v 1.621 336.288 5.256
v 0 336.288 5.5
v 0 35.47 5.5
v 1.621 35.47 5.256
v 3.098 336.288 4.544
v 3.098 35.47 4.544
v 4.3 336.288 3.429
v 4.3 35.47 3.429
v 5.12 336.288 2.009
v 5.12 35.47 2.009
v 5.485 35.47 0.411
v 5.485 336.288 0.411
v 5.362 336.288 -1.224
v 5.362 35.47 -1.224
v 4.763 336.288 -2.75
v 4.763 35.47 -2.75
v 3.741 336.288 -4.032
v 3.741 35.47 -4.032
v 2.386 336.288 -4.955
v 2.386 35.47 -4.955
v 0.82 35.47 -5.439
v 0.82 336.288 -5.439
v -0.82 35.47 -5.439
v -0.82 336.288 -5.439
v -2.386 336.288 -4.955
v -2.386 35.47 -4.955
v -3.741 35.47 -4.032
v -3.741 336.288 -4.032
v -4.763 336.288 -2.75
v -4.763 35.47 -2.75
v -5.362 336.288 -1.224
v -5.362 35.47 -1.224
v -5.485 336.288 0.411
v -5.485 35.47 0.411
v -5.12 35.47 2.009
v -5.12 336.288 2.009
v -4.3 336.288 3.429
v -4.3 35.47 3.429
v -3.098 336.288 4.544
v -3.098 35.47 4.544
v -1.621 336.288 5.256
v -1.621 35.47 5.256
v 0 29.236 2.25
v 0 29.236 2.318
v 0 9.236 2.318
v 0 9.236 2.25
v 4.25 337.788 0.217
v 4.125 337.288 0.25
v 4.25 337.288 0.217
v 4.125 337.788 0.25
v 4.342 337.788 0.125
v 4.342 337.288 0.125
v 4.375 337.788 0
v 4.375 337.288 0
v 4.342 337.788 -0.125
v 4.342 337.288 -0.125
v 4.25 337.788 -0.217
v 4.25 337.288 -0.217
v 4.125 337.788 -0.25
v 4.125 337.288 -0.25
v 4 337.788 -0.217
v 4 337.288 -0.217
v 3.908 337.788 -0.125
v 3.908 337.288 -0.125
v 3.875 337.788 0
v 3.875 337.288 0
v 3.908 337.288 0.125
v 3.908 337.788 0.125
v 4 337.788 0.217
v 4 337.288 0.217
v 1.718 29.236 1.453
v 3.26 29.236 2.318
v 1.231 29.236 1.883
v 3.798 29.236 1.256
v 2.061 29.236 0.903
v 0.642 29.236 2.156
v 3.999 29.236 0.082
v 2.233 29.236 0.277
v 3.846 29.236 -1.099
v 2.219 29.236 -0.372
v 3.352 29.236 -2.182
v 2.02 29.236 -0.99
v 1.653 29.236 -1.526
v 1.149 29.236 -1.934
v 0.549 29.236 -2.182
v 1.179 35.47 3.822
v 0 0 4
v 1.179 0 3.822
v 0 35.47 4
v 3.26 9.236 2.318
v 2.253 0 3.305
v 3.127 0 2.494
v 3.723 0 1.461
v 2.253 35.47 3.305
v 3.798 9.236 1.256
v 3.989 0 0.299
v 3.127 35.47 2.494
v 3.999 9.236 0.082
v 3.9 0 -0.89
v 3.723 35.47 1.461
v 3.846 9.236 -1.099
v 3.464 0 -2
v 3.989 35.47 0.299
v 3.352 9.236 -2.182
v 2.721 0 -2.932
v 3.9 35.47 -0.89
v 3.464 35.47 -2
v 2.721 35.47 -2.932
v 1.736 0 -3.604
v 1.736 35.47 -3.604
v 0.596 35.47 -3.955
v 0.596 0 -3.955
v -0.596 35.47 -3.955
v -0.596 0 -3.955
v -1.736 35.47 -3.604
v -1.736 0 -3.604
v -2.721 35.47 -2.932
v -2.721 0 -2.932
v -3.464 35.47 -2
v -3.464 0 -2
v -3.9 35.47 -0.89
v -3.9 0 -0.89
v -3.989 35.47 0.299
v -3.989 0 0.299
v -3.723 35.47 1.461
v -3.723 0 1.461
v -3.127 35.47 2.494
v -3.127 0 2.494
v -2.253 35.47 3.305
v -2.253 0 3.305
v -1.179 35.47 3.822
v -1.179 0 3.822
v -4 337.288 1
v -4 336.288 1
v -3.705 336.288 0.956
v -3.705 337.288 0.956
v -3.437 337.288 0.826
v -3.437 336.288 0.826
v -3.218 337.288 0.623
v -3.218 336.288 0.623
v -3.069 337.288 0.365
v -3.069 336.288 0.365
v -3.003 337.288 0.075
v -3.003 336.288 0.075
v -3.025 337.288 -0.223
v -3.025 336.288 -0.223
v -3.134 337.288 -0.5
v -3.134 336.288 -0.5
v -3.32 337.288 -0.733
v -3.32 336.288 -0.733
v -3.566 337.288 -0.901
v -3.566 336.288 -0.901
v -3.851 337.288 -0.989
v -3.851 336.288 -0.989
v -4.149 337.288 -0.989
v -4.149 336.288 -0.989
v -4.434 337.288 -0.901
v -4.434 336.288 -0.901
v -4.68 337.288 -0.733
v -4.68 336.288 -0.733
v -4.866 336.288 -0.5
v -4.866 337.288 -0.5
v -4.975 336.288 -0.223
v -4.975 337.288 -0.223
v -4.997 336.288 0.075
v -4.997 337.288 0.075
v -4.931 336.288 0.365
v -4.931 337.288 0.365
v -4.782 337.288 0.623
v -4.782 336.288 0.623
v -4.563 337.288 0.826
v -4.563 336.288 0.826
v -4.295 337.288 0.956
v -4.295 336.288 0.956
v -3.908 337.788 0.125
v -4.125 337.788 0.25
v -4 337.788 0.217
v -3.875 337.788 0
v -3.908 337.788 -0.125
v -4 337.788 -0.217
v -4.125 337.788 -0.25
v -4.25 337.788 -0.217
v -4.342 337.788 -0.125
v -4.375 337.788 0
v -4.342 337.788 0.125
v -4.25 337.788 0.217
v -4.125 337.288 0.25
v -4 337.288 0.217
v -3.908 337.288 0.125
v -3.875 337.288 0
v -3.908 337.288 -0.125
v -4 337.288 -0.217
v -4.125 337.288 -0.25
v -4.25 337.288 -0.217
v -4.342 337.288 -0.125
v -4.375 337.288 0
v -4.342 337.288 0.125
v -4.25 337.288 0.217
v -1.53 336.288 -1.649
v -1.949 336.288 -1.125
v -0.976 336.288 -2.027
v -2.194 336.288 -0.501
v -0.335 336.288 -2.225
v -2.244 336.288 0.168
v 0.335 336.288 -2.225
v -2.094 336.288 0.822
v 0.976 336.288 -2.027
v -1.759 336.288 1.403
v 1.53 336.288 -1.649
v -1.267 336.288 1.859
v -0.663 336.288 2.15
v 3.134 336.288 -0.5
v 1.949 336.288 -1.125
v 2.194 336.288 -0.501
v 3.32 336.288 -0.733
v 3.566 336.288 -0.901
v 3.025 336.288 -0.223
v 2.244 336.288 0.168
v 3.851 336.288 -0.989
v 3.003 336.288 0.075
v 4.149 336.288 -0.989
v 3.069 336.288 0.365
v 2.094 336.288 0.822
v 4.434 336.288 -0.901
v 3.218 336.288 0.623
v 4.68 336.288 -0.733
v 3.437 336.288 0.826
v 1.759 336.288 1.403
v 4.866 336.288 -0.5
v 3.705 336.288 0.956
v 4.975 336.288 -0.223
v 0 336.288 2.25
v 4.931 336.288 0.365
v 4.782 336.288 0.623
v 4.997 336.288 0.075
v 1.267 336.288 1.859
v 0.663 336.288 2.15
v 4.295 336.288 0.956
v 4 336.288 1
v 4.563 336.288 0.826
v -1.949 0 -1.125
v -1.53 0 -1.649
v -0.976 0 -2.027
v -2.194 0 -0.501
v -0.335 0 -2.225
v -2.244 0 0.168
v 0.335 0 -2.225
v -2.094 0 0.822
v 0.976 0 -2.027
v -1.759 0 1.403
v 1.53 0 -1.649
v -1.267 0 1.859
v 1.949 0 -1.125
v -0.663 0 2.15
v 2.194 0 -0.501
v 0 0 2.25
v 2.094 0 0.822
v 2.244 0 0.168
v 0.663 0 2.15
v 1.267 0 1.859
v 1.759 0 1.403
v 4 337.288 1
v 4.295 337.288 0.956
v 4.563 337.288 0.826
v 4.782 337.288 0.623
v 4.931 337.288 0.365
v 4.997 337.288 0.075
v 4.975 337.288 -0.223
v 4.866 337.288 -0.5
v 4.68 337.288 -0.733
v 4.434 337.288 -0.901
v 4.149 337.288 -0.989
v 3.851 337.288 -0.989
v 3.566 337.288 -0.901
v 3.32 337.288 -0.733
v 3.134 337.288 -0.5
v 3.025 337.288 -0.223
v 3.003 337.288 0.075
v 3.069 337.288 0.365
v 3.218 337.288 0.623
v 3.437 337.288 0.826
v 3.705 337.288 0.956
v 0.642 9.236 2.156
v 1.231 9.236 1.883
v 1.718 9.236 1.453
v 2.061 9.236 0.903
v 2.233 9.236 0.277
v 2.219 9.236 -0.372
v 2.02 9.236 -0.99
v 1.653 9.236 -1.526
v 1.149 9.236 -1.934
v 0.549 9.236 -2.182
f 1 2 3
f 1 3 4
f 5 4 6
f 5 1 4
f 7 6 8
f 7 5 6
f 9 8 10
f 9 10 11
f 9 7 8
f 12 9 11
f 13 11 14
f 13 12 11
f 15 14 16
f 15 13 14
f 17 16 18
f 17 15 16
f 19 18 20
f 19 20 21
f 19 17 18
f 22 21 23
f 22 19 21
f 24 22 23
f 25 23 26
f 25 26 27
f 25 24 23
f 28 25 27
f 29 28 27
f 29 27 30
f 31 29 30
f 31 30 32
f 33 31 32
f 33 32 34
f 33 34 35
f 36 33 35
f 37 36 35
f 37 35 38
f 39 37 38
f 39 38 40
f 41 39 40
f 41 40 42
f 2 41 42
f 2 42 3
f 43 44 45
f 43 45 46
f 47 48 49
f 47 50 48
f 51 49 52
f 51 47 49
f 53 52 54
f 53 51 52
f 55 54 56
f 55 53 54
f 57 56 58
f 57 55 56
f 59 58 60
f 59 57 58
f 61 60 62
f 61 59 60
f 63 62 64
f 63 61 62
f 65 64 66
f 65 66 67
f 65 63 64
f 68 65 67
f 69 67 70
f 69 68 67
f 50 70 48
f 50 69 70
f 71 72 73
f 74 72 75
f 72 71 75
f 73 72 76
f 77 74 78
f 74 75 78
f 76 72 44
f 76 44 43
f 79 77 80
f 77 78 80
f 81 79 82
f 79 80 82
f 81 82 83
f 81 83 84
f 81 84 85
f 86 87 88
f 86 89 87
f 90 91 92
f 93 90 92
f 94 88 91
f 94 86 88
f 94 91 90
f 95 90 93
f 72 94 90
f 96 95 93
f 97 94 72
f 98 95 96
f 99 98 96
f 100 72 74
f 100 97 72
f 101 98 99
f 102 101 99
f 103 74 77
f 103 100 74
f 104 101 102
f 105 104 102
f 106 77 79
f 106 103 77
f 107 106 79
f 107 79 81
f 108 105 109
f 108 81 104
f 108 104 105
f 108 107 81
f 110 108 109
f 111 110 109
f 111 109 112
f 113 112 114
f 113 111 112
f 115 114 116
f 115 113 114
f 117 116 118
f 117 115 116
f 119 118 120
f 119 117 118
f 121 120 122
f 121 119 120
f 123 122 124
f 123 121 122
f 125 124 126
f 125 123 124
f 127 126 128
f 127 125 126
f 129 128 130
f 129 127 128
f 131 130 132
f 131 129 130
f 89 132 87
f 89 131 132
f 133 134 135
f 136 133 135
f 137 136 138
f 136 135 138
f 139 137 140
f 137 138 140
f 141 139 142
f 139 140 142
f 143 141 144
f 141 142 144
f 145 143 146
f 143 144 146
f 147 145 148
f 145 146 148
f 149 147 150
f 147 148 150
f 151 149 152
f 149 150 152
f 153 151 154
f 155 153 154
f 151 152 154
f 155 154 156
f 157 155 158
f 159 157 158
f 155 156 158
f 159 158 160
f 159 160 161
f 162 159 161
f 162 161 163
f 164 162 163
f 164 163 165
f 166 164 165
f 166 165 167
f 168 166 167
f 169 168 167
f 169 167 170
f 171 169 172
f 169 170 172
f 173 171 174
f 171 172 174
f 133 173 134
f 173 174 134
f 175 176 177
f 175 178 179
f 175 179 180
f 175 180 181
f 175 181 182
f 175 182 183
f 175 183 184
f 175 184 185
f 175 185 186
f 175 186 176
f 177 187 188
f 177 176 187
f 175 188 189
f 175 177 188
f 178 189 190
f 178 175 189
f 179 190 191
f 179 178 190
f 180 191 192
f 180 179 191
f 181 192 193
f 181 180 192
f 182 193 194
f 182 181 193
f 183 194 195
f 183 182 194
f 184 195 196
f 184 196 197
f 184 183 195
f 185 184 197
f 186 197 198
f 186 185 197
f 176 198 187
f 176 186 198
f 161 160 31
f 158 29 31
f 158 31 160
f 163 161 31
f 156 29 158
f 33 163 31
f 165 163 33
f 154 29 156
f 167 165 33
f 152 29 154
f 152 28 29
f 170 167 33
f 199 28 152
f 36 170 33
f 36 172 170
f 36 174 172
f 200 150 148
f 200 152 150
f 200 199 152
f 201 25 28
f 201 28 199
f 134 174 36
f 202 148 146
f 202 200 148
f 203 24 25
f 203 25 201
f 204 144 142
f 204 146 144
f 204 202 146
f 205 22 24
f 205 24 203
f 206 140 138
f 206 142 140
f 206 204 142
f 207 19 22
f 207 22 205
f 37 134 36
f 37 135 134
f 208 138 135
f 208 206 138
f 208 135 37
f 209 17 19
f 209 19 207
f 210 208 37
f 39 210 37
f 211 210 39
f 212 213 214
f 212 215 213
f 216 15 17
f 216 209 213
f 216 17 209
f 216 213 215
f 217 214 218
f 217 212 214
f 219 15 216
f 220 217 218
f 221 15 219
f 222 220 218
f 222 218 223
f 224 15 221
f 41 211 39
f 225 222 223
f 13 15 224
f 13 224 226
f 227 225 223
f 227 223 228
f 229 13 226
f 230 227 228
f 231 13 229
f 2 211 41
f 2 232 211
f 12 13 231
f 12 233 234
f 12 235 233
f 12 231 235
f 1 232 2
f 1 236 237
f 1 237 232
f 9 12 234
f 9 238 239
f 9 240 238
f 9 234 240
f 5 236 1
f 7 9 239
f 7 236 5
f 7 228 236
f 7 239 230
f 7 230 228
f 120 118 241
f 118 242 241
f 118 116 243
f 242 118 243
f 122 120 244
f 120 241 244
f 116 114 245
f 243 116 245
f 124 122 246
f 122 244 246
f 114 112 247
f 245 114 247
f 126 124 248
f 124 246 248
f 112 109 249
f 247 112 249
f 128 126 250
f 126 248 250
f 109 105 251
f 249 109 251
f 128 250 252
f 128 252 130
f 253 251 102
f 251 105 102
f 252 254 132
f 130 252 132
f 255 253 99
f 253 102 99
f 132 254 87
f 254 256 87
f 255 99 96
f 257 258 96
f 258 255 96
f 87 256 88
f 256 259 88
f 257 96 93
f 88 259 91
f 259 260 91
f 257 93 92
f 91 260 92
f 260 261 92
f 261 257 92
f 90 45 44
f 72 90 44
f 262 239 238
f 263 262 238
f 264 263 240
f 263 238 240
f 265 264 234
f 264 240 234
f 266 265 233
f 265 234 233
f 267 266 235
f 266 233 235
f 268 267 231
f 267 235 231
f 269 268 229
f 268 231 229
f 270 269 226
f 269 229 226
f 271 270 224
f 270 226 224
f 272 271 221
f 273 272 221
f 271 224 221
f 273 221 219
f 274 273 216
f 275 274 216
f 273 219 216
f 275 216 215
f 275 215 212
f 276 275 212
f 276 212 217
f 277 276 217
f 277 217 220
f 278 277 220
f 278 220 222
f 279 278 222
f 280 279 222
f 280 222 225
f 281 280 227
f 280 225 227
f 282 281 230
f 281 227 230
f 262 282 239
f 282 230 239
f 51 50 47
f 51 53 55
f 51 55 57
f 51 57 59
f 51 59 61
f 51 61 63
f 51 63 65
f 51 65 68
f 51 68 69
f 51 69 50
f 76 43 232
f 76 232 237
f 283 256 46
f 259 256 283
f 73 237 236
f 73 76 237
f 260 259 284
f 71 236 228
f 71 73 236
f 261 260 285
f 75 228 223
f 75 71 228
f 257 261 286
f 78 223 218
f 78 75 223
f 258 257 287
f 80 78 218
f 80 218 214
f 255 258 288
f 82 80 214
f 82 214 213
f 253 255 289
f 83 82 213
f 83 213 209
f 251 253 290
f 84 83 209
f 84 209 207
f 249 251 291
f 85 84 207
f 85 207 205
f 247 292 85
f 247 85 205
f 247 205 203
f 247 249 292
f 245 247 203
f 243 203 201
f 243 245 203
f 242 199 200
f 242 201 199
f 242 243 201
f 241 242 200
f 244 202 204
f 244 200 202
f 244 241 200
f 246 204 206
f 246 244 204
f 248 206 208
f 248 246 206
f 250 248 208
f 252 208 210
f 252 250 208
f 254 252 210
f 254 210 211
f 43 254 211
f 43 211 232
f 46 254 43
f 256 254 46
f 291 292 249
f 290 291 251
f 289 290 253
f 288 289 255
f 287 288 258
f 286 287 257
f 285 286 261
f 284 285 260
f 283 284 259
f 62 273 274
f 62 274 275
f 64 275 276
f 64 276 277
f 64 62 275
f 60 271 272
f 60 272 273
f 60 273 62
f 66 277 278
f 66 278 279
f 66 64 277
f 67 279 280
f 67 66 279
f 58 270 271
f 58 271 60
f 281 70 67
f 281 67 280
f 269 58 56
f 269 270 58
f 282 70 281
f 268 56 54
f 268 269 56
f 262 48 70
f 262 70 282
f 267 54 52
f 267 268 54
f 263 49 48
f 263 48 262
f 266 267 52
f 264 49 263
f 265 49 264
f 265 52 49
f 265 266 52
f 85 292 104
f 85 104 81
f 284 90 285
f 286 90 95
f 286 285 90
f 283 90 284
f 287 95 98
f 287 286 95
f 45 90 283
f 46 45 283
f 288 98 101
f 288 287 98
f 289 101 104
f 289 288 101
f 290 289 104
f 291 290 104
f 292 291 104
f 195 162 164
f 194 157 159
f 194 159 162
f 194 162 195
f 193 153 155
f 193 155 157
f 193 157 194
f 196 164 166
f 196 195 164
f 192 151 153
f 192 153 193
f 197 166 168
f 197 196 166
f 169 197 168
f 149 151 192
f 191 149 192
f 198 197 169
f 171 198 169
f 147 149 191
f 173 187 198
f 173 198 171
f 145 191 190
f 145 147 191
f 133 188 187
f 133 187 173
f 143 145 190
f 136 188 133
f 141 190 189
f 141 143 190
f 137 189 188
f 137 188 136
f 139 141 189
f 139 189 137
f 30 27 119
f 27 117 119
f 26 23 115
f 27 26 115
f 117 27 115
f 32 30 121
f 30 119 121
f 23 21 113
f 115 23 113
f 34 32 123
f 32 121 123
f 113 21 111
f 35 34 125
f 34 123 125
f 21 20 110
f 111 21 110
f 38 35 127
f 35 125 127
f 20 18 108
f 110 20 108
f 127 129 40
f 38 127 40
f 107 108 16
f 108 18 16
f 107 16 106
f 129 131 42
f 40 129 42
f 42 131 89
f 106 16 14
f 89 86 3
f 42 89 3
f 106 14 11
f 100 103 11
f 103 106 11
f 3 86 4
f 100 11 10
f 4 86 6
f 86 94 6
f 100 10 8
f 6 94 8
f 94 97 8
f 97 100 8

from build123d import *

# Parameters (mm, degrees)
SWEEP3_PROFILE_R    = 4
SWEEP4_PROFILE_R    = 5.5
SKETCH45_R          = 2.25
CUT_EXTRUDE2_DEPTH  = 337.377466094
SWEEP5_PROFILE_R    = 0.25
SWEEP6_PROFILE_R    = 0.25
SKETCH72_W          = 4.5
SKETCH72_H          = 20
CUT_EXTRUDE6_DEPTH  = 20
SKETCH77_R          = 1
BOSS_EXTRUDE1_DEPTH = 1


with BuildPart() as part:
    # Sweep3: sweep along a path in Sketch31
    with BuildLine(Plane.XY) as sweep3_path:
        Line((0, 0), (0, 35.470165431))
    # Sweep3 profile (on start of the path) → Sweep3 (sweep)
    with BuildSketch(Plane.ZX):
        Circle(SWEEP3_PROFILE_R)
    sweep(path=sweep3_path.line)

    # Sweep4: sweep along a path in Sketch38
    with BuildLine(Plane.XY) as sweep4_path:
        Line((0, 35.470165431), (0, 336.287525335))
    # Sweep4 profile (on start of the path) → Sweep4 (sweep)
    with BuildSketch(Plane.ZX.offset(35.470165431)):
        Circle(SWEEP4_PROFILE_R)
    sweep(path=sweep4_path.line)

    # Sketch45 → Cut-Extrude2 (cut, through all)
    with BuildSketch(Plane(origin=(0, 0, 0), x_dir=(1, 0, 0), z_dir=(0, 1, 0))):
        with Locations(Location((0, 0, 0), (0, 0, 270))):
            Circle(SKETCH45_R)
    extrude(amount=CUT_EXTRUDE2_DEPTH, mode=Mode.SUBTRACT)

    # Sweep5: sweep along a curve in space
    with BuildLine() as sweep5_path:
        Line((4.125, 336.287525335, 5.531e-06), (4.125, 337.787525335, 5.531e-06))
    # Sweep5 profile (on start of the path) → Sweep5 (sweep)
    with BuildSketch(Plane(origin=(4.125, 336.287525335, 5.531e-06), x_dir=(0, 0, 1), z_dir=(0, 1, 0))):
        Circle(SWEEP5_PROFILE_R)
    sweep(path=sweep5_path.line)

    # Sweep6: sweep along a curve in space
    with BuildLine() as sweep6_path:
        Line((-4.125, 336.287525335, 9.31e-07), (-4.125, 337.787525335, 9.31e-07))
    # Sweep6 profile (on start of the path) → Sweep6 (sweep)
    with BuildSketch(Plane(origin=(-4.125, 336.287525335, 9.31e-07), x_dir=(0, 0, 1), z_dir=(0, 1, 0))):
        Circle(SWEEP6_PROFILE_R)
    sweep(path=sweep6_path.line)

    # Sketch72 → Cut-Extrude6 (cut)
    with BuildSketch(Plane(origin=(0, 0, 0), x_dir=(0, 0, -1), z_dir=(1, 0, 0))):
        with Locations((-0.068000409, 19.236124066)):
            Rectangle(SKETCH72_W, SKETCH72_H)
    extrude(amount=CUT_EXTRUDE6_DEPTH, mode=Mode.SUBTRACT)

    # Sketch77 → Boss-Extrude1 (add)
    with BuildSketch(Plane(origin=(0, 336.287525335, 0), x_dir=(1, 0, 0), z_dir=(0, 1, 0))):
        with Locations(Location((-4, -9.03e-07, 0), (0, 0, 270))):
            Circle(SKETCH77_R)
        with Locations(Location((4, -5.363e-06, 0), (0, 0, 270))):
            Circle(SKETCH77_R)
    extrude(amount=BOSS_EXTRUDE1_DEPTH)


solid = part.part
